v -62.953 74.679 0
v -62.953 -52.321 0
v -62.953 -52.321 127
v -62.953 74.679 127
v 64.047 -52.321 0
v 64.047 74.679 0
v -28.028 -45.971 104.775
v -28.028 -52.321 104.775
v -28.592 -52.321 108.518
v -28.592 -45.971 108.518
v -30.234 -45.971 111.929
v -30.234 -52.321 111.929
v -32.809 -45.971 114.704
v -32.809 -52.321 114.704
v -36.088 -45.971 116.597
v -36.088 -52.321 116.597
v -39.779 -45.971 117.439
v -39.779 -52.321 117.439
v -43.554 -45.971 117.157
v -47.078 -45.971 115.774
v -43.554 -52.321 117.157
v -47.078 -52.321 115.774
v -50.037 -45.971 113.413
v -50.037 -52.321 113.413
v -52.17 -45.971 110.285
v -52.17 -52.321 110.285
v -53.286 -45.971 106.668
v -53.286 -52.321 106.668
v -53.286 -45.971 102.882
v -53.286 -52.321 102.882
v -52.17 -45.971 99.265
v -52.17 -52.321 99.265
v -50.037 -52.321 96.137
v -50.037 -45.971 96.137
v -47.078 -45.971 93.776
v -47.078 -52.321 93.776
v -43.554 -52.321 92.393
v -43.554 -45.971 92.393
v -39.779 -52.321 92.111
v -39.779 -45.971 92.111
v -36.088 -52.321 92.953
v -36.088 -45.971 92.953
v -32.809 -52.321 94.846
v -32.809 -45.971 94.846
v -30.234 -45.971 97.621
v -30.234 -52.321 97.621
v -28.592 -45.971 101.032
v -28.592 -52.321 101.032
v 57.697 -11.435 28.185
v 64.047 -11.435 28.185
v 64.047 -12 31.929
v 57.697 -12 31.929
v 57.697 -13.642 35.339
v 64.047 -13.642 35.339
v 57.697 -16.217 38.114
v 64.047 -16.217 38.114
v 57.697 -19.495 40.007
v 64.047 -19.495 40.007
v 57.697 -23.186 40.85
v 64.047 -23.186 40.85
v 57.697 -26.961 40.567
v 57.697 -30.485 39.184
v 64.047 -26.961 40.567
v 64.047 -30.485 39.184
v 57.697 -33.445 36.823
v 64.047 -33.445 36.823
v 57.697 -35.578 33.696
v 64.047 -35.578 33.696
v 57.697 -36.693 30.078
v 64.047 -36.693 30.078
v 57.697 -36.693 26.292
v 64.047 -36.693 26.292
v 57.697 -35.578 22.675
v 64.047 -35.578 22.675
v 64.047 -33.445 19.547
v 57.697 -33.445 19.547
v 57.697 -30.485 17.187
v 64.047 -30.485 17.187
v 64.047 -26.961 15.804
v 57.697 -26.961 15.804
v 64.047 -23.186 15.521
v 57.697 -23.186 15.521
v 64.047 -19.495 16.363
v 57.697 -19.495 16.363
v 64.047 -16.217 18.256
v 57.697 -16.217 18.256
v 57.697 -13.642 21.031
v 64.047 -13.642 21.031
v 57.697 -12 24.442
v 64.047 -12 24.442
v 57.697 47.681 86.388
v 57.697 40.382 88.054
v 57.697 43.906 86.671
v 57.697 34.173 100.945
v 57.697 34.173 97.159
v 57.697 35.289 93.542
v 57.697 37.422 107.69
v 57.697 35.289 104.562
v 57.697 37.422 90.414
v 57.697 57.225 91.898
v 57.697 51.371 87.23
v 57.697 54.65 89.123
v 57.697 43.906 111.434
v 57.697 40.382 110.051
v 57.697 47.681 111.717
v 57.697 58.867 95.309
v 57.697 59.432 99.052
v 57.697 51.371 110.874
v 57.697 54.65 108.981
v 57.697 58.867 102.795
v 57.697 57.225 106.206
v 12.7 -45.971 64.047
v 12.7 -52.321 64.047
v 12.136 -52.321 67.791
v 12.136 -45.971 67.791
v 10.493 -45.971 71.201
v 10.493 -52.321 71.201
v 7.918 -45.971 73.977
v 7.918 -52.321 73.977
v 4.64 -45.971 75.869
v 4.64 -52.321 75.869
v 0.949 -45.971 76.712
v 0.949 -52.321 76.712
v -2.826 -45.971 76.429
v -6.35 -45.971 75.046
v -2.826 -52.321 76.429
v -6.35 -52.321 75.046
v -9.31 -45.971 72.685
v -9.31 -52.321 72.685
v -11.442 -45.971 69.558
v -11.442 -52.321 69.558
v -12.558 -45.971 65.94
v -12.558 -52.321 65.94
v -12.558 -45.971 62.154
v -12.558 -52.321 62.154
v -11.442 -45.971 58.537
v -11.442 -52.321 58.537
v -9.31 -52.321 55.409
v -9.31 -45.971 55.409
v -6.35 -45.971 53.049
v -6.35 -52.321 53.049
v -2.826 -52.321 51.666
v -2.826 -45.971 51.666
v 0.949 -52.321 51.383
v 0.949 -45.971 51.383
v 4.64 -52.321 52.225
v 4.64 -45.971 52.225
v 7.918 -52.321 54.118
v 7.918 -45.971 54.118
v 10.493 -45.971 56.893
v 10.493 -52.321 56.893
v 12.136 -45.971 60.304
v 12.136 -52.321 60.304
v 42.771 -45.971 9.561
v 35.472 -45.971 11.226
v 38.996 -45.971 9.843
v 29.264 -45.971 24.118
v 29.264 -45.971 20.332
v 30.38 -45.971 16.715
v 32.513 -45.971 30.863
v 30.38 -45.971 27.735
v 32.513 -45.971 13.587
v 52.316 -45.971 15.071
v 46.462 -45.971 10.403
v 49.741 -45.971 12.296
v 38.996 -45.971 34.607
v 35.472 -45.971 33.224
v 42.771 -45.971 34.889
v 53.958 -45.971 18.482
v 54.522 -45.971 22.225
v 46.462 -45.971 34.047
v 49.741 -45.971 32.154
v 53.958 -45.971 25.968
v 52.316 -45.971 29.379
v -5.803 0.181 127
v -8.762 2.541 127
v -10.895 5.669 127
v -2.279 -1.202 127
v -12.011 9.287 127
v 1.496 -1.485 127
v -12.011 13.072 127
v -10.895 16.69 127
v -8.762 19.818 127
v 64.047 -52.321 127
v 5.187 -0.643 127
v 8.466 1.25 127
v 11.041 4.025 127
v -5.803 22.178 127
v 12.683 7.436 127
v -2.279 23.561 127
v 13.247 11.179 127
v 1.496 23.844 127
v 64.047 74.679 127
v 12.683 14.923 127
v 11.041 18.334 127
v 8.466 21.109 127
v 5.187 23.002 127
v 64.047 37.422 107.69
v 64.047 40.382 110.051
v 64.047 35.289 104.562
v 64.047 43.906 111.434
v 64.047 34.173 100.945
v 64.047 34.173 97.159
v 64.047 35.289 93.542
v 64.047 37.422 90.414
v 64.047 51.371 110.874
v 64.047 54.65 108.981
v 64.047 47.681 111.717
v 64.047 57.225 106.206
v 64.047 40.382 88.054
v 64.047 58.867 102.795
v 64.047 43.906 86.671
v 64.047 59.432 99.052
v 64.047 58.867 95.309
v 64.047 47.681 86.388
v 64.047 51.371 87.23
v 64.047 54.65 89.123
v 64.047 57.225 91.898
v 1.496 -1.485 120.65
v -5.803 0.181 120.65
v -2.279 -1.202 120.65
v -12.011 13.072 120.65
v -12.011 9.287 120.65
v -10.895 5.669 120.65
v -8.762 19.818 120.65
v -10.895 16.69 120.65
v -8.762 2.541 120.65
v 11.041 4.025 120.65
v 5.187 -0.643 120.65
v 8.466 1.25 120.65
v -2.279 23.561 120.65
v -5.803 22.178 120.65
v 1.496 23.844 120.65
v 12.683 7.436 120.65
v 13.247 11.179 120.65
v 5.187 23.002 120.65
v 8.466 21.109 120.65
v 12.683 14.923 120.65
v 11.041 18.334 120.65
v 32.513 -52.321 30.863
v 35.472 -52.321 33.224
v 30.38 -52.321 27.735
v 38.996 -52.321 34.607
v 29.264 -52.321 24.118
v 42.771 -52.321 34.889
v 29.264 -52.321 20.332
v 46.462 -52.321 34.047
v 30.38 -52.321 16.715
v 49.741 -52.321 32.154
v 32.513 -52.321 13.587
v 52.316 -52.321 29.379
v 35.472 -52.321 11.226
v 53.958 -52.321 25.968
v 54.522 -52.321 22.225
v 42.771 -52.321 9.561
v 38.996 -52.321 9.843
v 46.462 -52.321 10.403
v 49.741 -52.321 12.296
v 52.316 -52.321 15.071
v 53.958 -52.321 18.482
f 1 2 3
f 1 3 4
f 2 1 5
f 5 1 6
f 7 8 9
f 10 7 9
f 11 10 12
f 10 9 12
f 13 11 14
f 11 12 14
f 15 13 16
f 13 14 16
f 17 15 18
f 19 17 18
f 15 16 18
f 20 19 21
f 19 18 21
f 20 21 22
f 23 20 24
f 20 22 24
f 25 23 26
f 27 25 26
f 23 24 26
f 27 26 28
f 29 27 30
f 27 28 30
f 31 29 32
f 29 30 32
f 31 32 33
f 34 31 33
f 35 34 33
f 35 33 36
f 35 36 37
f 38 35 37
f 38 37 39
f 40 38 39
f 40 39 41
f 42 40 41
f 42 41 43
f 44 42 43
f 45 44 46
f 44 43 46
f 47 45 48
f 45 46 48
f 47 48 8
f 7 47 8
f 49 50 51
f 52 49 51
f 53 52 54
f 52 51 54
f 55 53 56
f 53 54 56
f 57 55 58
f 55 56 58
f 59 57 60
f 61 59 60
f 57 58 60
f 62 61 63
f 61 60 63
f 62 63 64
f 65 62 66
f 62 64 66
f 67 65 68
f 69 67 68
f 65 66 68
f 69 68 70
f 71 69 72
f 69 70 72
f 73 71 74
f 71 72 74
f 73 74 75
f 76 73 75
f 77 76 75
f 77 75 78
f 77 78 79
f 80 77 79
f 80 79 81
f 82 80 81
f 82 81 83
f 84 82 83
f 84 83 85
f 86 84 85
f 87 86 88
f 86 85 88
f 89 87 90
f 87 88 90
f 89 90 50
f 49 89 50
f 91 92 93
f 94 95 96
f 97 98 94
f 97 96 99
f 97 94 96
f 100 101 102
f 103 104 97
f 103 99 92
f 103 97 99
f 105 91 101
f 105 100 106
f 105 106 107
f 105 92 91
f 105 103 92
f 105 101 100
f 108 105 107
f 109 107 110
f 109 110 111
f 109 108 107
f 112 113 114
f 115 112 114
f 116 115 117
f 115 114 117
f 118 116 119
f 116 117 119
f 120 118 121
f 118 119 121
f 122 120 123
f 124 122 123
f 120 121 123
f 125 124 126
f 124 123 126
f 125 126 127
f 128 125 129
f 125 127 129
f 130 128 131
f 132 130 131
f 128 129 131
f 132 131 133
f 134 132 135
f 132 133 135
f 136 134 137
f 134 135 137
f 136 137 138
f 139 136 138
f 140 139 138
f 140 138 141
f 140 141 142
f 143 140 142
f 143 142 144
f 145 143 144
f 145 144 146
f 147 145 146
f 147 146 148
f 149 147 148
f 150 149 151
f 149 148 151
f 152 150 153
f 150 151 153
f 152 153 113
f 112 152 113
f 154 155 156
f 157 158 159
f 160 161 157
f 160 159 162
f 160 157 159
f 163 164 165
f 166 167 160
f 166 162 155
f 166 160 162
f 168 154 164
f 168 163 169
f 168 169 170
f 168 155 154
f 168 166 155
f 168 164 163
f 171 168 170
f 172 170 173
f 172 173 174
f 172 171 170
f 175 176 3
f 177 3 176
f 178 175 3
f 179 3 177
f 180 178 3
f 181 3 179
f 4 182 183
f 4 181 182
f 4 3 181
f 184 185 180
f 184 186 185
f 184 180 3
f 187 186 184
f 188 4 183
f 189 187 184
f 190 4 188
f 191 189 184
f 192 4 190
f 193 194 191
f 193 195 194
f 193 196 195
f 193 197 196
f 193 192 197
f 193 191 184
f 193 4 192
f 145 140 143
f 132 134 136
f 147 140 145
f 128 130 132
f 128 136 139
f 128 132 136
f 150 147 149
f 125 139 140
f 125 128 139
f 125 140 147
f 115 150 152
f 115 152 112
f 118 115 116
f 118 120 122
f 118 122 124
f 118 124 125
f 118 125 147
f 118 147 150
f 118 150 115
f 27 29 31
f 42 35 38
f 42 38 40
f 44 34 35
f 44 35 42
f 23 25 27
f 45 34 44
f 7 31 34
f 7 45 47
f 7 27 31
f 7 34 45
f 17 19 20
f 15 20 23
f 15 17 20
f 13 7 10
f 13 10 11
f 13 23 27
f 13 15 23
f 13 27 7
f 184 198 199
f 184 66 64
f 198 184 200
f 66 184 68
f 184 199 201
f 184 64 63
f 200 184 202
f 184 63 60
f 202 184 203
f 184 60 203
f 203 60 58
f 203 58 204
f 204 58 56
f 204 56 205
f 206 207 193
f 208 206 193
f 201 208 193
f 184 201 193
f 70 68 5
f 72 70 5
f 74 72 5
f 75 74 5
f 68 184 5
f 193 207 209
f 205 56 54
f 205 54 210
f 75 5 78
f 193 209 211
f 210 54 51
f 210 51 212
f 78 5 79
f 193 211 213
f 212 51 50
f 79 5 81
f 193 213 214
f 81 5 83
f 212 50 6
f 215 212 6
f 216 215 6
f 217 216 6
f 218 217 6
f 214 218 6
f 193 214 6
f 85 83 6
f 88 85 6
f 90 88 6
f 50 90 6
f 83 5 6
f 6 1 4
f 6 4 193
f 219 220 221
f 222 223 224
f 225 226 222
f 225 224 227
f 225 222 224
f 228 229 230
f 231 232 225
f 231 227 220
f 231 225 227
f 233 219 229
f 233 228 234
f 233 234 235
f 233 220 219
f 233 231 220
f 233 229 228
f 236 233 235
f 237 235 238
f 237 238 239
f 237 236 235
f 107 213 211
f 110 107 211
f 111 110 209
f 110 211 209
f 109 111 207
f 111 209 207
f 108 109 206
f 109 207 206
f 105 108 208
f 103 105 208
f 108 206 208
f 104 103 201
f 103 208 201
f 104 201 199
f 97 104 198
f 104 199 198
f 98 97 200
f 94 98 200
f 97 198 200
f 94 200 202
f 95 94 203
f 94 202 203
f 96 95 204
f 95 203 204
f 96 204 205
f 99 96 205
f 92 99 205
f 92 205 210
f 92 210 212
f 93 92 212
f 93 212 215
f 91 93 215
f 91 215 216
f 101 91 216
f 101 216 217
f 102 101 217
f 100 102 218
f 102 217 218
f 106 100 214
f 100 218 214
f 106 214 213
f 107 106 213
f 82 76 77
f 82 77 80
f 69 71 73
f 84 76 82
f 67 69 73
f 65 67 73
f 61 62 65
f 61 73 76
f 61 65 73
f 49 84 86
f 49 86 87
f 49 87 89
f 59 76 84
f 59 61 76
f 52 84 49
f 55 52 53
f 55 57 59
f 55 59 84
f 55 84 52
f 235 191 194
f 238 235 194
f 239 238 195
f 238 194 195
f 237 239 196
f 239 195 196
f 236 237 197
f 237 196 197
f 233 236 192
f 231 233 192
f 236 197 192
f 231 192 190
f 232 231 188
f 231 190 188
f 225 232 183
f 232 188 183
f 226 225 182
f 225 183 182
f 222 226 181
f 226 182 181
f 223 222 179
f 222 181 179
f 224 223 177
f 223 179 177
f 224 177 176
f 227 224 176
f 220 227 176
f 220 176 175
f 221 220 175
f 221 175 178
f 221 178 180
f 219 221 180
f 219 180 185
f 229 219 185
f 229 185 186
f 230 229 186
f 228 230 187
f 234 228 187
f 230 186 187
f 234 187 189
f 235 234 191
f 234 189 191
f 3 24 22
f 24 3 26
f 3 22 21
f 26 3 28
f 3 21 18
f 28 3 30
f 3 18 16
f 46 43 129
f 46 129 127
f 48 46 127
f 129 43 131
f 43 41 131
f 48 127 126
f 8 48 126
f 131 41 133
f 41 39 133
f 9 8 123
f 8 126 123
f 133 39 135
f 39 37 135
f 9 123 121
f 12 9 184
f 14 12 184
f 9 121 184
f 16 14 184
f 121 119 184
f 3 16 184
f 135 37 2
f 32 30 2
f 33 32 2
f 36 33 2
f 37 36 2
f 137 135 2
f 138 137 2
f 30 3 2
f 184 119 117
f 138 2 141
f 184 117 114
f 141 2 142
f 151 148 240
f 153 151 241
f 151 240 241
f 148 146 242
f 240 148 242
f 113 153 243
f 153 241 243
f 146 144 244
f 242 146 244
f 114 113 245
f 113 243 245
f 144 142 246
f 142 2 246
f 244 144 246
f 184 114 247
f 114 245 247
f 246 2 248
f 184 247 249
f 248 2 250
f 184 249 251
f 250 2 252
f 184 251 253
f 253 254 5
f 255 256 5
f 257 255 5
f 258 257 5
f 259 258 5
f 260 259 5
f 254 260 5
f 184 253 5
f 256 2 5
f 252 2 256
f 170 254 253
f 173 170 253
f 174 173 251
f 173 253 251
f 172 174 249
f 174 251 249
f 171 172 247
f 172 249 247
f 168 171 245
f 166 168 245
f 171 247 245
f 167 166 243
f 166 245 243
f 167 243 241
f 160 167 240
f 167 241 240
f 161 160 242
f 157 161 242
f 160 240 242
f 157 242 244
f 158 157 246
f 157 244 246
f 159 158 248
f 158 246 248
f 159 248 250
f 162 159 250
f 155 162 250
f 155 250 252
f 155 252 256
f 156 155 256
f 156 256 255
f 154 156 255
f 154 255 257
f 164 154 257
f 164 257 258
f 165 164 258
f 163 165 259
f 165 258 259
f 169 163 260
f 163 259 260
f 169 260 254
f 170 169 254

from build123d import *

# Parameters (mm, degrees)
F0_W     = 127
F0_H     = 127
F1_DEPTH = 127
F2_R     = 12.7
F3_DEPTH = 6.35
F4_R     = 12.7
F5_DEPTH = 6.35
F6_DEPTH = 6.35
F7_R     = 12.7
F8_DEPTH = 6.35


with BuildPart() as f1:
    # F0 (on Top) → F1 (new body)
    with BuildSketch(Plane.XY):
        with Locations((0.547273, 11.179494)):
            Rectangle(F0_W, F0_H)
    extrude(amount=F1_DEPTH)

    # F2 (on face) → F3 (cut)
    with BuildSketch(Plane.XY.offset(127)):
        with Locations((0.547273, 11.179494)):
            Circle(F2_R)
    extrude(amount=-F3_DEPTH, mode=Mode.SUBTRACT)

    # F4 (on face) → F5 (join)
    with BuildSketch(Plane.YZ.offset(64.047273)):
        with Locations((46.731588, 99.052094)):
            Circle(F4_R)
        with Locations((-24.13532, 28.185186)):
            Circle(F4_R)
    extrude(amount=-F5_DEPTH)

    # F4 (on face) → F6 (cut)
    with BuildSketch(Plane.YZ.offset(64.047273)):
        with Locations((46.731588, 99.052094)):
            Circle(F4_R)
        with Locations((-24.13532, 28.185186)):
            Circle(F4_R)
    extrude(amount=-F6_DEPTH, mode=Mode.SUBTRACT)

    # F7 (on face) → F8 (cut)
    with BuildSketch(Plane.XZ.offset(52.320506)):
        with Locations((-40.727727, 104.775)):
            Circle(F7_R)
        with Locations((0, 64.047273)):
            Circle(F7_R)
        with Locations((41.822273, 22.225)):
            Circle(F7_R)
    extrude(amount=-F8_DEPTH, mode=Mode.SUBTRACT)


solid = f1.part
